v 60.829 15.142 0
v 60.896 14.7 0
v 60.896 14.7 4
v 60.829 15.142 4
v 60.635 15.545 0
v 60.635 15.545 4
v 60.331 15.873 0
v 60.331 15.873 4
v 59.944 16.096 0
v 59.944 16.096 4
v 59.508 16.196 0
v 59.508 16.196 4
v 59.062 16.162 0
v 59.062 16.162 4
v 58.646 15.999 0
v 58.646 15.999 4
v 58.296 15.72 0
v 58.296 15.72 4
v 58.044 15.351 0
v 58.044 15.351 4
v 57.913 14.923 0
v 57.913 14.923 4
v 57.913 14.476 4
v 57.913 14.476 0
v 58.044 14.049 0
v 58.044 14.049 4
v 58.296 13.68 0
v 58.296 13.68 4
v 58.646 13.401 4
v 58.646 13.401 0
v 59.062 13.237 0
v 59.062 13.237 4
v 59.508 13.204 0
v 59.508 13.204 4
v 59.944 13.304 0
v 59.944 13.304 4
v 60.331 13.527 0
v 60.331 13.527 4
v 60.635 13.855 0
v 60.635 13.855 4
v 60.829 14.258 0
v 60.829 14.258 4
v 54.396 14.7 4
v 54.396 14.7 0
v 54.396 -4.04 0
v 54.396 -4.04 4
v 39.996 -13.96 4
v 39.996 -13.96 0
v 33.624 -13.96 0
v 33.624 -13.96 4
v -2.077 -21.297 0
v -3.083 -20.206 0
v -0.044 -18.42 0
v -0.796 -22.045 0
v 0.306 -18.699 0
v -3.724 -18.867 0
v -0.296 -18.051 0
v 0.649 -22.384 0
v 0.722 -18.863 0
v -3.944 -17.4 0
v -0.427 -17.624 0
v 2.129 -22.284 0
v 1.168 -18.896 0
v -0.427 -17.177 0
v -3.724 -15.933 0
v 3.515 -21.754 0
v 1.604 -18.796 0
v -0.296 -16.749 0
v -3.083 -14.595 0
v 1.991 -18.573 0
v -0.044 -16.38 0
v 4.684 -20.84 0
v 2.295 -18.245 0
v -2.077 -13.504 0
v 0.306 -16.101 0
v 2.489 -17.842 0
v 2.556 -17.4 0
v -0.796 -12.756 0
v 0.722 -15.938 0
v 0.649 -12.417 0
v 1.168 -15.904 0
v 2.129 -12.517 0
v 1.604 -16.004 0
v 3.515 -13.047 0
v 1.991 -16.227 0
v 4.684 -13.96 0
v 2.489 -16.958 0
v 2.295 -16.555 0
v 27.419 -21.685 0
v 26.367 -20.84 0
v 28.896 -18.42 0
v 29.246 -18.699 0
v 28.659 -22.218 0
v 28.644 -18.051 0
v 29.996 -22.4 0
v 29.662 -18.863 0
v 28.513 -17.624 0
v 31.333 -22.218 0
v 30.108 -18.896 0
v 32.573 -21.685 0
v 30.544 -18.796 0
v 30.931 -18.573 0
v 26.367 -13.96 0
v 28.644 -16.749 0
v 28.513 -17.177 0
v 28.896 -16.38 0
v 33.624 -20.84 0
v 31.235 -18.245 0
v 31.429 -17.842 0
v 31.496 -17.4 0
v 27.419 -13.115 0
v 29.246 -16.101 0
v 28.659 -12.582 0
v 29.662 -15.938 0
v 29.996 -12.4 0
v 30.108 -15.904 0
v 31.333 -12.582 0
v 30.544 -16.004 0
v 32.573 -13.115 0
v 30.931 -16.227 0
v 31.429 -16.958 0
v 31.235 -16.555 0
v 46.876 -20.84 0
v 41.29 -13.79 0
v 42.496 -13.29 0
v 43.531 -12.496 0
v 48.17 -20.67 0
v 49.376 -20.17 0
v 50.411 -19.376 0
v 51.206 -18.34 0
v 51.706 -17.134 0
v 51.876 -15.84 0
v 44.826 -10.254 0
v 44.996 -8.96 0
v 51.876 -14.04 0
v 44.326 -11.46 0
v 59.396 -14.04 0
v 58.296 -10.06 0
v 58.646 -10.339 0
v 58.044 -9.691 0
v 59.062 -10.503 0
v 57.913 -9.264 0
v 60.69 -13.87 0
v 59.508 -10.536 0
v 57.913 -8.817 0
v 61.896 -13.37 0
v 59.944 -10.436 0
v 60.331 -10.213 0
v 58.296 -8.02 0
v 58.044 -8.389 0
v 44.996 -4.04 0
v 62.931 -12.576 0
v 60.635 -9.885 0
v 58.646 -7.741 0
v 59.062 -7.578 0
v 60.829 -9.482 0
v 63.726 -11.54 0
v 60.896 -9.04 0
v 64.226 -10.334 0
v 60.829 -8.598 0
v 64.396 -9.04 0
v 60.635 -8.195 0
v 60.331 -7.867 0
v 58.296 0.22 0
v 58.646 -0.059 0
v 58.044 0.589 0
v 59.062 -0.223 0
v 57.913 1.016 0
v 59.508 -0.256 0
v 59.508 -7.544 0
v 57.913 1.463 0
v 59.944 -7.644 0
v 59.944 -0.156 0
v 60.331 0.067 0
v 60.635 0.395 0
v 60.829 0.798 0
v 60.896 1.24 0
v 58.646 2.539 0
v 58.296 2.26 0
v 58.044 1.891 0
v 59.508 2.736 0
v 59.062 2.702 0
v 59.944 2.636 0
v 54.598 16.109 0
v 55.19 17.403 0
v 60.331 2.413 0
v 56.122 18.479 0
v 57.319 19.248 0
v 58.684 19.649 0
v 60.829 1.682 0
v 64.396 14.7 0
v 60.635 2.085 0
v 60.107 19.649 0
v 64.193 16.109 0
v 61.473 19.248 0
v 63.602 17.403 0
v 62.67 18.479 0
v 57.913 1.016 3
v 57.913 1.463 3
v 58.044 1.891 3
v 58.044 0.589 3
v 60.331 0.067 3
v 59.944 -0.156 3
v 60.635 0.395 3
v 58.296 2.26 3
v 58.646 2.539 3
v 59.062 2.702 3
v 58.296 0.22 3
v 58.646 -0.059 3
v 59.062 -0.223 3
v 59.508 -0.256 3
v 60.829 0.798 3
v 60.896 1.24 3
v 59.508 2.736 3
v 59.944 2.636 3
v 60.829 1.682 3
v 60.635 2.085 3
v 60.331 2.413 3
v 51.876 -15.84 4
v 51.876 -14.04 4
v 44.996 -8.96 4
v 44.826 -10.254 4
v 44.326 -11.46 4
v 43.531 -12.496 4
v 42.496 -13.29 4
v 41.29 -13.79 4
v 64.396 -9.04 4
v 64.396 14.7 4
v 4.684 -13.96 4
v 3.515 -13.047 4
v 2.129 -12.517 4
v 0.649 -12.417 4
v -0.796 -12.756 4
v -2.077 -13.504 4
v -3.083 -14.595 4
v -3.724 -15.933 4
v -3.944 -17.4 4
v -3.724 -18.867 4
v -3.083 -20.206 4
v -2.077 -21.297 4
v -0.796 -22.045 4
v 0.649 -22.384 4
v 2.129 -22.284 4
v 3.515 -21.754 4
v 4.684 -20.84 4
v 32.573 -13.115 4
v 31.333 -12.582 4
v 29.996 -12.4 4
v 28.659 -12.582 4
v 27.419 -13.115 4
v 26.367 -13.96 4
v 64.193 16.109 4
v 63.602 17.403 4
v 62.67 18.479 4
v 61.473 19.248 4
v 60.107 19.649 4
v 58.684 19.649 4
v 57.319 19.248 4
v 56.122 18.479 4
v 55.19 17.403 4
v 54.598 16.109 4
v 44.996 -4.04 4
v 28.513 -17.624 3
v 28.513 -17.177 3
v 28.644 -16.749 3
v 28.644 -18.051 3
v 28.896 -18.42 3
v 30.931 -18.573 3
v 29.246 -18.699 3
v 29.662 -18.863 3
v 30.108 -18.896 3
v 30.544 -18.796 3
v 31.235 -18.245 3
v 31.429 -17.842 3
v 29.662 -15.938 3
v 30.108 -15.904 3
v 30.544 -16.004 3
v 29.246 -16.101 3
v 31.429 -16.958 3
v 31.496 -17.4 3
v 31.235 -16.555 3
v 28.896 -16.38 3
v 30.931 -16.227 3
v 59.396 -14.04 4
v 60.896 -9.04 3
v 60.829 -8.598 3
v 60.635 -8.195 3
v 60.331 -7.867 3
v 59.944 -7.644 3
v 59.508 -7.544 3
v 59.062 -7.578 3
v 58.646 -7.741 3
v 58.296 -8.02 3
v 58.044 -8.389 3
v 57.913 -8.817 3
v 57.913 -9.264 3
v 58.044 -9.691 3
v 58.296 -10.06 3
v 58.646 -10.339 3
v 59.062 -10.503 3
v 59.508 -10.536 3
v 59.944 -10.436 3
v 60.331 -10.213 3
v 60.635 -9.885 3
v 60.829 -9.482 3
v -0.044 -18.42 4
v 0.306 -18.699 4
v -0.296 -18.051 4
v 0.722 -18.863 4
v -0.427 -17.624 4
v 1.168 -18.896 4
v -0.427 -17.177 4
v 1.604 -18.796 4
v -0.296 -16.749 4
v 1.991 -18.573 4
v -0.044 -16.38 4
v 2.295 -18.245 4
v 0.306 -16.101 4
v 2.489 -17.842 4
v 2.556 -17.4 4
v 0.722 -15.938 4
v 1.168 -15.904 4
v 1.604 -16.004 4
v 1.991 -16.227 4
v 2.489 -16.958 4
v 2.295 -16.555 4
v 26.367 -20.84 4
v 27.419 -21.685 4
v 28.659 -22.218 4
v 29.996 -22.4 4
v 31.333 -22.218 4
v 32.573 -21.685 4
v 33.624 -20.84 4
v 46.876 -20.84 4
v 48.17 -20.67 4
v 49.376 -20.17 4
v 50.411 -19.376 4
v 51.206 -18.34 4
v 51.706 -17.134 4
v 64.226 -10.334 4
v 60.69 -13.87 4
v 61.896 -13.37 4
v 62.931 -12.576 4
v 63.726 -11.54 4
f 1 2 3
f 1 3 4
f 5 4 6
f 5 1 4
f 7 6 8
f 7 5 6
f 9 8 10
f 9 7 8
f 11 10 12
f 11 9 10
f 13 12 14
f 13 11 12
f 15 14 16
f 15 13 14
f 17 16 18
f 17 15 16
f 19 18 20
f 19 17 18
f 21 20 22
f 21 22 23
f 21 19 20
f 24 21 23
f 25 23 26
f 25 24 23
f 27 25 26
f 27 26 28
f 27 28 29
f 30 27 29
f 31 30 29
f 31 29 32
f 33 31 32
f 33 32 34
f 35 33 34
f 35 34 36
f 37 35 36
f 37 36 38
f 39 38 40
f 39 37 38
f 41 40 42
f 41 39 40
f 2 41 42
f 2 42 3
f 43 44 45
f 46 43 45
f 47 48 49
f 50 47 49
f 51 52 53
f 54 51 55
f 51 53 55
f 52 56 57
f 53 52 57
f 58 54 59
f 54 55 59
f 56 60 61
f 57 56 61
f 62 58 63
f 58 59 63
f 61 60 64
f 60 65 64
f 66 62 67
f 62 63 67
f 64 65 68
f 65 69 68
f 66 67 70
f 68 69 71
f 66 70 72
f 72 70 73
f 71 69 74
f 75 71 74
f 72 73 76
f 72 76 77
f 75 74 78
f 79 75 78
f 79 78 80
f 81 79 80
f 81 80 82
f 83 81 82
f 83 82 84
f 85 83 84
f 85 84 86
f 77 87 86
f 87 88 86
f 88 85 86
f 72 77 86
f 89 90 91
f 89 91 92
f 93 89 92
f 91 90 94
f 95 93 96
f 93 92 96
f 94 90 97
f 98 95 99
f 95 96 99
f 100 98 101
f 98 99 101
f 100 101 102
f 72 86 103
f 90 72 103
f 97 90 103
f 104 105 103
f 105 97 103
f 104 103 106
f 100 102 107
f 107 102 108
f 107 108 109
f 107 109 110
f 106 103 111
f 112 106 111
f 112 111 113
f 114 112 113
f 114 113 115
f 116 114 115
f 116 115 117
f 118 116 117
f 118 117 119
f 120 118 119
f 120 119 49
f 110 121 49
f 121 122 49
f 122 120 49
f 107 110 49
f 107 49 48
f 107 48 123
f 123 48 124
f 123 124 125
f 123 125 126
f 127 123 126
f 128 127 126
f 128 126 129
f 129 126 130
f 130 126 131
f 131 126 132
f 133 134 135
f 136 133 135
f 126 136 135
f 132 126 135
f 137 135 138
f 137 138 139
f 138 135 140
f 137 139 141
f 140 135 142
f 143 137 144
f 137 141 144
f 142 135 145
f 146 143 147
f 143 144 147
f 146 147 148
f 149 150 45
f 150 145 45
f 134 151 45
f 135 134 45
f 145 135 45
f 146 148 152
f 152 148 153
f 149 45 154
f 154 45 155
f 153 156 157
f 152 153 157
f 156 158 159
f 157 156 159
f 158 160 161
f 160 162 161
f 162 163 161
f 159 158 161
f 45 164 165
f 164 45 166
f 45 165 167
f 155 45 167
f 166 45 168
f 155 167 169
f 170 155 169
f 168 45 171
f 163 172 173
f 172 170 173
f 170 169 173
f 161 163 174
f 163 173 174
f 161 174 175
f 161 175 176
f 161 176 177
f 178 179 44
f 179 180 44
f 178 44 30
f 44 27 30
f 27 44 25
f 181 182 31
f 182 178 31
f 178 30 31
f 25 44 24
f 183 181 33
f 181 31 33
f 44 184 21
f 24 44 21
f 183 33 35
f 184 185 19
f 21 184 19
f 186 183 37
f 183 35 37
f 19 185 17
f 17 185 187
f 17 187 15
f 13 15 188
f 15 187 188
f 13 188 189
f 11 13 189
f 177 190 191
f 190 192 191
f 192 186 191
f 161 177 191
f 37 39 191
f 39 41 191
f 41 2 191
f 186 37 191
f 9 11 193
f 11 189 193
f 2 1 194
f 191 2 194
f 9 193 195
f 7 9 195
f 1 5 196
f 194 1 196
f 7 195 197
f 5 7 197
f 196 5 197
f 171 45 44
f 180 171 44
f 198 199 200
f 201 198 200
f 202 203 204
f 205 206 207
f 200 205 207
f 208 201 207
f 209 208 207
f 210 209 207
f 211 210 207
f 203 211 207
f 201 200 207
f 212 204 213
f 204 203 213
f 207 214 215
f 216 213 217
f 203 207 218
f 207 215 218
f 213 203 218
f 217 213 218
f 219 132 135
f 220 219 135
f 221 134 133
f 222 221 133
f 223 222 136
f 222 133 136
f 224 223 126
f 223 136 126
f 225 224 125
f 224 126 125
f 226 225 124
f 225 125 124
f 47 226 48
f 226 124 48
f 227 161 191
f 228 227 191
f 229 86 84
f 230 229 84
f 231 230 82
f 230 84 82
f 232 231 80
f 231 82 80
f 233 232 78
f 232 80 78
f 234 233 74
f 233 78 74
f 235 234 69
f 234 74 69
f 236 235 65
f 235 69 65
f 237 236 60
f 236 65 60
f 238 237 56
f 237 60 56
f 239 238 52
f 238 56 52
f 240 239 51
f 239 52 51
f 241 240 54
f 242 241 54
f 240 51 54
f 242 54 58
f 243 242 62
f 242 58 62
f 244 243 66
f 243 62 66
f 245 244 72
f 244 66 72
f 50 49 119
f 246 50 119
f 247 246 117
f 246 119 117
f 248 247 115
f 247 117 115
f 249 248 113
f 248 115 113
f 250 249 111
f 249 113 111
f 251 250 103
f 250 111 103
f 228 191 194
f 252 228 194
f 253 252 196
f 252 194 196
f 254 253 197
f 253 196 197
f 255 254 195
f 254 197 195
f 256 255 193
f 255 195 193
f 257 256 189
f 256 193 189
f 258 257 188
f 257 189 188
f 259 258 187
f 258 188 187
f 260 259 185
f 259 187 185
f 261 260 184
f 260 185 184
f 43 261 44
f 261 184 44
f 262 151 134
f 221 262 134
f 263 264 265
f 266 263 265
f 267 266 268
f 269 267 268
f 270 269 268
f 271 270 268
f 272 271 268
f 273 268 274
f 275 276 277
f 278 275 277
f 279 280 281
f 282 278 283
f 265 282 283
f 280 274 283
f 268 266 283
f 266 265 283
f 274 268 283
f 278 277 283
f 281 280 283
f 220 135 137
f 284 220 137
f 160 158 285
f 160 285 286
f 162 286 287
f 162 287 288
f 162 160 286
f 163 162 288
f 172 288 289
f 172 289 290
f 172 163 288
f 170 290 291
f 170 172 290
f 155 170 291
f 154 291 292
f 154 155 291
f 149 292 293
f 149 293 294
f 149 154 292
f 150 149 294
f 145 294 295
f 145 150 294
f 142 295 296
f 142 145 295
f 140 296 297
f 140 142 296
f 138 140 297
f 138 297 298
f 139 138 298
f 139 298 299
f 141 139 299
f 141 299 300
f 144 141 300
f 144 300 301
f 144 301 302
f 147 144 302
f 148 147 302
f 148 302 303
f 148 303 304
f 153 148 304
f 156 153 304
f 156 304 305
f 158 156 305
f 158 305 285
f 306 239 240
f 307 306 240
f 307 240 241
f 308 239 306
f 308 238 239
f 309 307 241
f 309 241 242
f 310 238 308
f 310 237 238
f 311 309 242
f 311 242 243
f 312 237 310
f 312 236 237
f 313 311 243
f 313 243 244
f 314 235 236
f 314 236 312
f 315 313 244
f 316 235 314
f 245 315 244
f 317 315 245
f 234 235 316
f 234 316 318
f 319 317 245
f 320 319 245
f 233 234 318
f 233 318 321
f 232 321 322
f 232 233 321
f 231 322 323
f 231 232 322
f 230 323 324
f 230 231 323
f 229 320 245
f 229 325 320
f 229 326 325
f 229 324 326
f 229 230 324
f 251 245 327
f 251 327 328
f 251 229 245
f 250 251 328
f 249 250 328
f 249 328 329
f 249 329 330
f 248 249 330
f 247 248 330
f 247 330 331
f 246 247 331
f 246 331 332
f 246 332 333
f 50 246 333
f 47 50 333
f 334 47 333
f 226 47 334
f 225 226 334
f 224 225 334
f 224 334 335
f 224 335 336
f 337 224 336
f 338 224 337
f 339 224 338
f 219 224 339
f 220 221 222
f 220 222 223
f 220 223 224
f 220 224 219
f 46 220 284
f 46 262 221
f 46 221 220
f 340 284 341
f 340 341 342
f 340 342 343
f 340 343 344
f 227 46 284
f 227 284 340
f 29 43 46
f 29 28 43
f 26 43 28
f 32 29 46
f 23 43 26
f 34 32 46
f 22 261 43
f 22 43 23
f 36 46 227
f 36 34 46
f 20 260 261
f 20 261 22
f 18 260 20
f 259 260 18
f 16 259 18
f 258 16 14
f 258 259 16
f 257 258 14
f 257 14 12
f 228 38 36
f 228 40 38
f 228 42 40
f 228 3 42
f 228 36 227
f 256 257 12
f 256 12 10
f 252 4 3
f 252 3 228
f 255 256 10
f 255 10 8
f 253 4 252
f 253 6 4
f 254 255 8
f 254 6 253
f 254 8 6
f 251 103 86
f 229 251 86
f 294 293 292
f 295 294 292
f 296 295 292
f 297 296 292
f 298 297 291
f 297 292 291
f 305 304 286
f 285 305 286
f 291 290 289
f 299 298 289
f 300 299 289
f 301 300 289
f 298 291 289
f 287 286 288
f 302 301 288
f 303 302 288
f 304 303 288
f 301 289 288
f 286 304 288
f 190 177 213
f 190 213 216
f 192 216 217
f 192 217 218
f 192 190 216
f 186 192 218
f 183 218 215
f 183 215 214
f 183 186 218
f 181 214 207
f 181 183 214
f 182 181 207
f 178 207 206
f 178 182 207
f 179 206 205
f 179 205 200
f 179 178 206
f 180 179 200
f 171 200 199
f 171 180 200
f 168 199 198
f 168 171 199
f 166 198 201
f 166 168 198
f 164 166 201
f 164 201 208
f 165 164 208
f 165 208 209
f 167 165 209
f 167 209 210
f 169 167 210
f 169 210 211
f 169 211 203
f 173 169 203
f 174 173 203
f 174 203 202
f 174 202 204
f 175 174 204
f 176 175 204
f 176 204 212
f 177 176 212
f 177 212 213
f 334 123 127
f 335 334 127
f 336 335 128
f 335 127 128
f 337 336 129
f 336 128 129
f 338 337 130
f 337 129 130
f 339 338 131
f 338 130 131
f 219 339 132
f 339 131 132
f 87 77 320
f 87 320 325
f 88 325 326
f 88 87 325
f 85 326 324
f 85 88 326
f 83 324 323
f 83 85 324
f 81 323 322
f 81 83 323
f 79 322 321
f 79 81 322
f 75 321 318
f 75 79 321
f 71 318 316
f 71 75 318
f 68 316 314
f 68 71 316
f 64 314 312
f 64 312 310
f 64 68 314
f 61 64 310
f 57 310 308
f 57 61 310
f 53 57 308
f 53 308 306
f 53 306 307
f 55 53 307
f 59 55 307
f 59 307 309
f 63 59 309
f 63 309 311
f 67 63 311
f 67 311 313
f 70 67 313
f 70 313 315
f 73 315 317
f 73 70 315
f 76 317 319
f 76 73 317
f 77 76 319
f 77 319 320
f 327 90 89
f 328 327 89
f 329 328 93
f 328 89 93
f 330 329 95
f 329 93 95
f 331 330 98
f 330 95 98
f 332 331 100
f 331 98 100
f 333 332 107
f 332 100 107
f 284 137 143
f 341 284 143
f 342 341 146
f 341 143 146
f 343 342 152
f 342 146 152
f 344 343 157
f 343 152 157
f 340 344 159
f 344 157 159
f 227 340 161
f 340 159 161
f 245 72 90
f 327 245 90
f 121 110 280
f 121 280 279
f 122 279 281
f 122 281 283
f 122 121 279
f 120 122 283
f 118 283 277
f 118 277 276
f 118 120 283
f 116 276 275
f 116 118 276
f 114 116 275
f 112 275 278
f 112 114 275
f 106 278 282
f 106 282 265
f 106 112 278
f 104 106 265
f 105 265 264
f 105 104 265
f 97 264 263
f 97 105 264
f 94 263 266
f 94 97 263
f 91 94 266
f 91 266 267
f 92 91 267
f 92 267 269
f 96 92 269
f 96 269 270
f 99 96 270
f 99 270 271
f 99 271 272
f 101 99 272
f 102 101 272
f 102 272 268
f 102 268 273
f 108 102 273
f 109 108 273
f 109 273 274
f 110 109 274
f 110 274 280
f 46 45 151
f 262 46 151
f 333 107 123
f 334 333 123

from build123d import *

# Parameters (mm, degrees)
CROQUIS1_R              = 1.5
SALIENTE_EXTRUIR1_DEPTH = 4
SALIENTE_EXTRUIR2_START = -1
CROQUIS2_R              = 1.5
SALIENTE_EXTRUIR2_DEPTH = 1


with BuildPart() as part:
    # Croquis1 → Saliente-Extruir1 (new body)
    with BuildSketch(Plane.XY):
        with BuildLine():
            Line((51.875922813, -14.040123785), (59.395922813, -14.040123785))
            ThreePointArc((59.395922813, -14.040123785), (62.931456719, -12.575657691), (64.395922813, -9.040123785))
            Line((64.395922813, -9.040123785), (64.395922813, 14.699876215))
            ThreePointArc((64.395922813, 14.699876215), (59.395922813, 19.699876215), (54.395922813, 14.699876215))
            Line((54.395922813, 14.699876215), (54.395922813, -4.040123785))
            Line((54.395922813, -4.040123785), (44.995922813, -4.040123785))
            Line((44.995922813, -4.040123785), (44.995922813, -8.960123785))
            ThreePointArc((44.995922813, -8.960123785), (43.531456719, -12.495657691), (39.995922813, -13.960123785))
            Line((39.995922813, -13.960123785), (33.624476244, -13.960123785))
            ThreePointArc((33.624476244, -13.960123785), (29.995922813, -12.400123785), (26.367369382, -13.960123785))
            Line((26.367369382, -13.960123785), (4.684476244, -13.960123785))
            ThreePointArc((4.684476244, -13.960123785), (-3.944077187, -17.400123785), (4.684476244, -20.840123785))
            Line((4.684476244, -20.840123785), (26.367369382, -20.840123785))
            ThreePointArc((26.367369382, -20.840123785), (29.995922813, -22.400123785), (33.624476244, -20.840123785))
            Line((33.624476244, -20.840123785), (46.875922813, -20.840123785))
            ThreePointArc((46.875922813, -20.840123785), (50.411456719, -19.375657691), (51.875922813, -15.840123785))
            Line((51.875922813, -15.840123785), (51.875922813, -14.040123785))
        make_face()
        with Locations((59.395922813, -9.040123785)):
            Circle(CROQUIS1_R, mode=Mode.SUBTRACT)
        with Locations((59.395922813, 1.239876215)):
            Circle(CROQUIS1_R, mode=Mode.SUBTRACT)
        with Locations((59.395922813, 14.699876215)):
            Circle(CROQUIS1_R, mode=Mode.SUBTRACT)
        with Locations((29.995922813, -17.400123785)):
            Circle(CROQUIS1_R, mode=Mode.SUBTRACT)
        with Locations((1.055922813, -17.400123785)):
            Circle(CROQUIS1_R, mode=Mode.SUBTRACT)
    extrude(amount=SALIENTE_EXTRUIR1_DEPTH)

    # Croquis2 → Saliente-Extruir2 (add)
    with BuildSketch(Plane.XY.offset(4).offset(SALIENTE_EXTRUIR2_START)):
        with Locations((59.395922813, 1.239876215)):
            Circle(CROQUIS2_R)
        with Locations((59.395922813, -9.040123785)):
            Circle(CROQUIS2_R)
        with Locations((29.995922813, -17.400123785)):
            Circle(CROQUIS2_R)
    extrude(amount=SALIENTE_EXTRUIR2_DEPTH)


solid = part.part
